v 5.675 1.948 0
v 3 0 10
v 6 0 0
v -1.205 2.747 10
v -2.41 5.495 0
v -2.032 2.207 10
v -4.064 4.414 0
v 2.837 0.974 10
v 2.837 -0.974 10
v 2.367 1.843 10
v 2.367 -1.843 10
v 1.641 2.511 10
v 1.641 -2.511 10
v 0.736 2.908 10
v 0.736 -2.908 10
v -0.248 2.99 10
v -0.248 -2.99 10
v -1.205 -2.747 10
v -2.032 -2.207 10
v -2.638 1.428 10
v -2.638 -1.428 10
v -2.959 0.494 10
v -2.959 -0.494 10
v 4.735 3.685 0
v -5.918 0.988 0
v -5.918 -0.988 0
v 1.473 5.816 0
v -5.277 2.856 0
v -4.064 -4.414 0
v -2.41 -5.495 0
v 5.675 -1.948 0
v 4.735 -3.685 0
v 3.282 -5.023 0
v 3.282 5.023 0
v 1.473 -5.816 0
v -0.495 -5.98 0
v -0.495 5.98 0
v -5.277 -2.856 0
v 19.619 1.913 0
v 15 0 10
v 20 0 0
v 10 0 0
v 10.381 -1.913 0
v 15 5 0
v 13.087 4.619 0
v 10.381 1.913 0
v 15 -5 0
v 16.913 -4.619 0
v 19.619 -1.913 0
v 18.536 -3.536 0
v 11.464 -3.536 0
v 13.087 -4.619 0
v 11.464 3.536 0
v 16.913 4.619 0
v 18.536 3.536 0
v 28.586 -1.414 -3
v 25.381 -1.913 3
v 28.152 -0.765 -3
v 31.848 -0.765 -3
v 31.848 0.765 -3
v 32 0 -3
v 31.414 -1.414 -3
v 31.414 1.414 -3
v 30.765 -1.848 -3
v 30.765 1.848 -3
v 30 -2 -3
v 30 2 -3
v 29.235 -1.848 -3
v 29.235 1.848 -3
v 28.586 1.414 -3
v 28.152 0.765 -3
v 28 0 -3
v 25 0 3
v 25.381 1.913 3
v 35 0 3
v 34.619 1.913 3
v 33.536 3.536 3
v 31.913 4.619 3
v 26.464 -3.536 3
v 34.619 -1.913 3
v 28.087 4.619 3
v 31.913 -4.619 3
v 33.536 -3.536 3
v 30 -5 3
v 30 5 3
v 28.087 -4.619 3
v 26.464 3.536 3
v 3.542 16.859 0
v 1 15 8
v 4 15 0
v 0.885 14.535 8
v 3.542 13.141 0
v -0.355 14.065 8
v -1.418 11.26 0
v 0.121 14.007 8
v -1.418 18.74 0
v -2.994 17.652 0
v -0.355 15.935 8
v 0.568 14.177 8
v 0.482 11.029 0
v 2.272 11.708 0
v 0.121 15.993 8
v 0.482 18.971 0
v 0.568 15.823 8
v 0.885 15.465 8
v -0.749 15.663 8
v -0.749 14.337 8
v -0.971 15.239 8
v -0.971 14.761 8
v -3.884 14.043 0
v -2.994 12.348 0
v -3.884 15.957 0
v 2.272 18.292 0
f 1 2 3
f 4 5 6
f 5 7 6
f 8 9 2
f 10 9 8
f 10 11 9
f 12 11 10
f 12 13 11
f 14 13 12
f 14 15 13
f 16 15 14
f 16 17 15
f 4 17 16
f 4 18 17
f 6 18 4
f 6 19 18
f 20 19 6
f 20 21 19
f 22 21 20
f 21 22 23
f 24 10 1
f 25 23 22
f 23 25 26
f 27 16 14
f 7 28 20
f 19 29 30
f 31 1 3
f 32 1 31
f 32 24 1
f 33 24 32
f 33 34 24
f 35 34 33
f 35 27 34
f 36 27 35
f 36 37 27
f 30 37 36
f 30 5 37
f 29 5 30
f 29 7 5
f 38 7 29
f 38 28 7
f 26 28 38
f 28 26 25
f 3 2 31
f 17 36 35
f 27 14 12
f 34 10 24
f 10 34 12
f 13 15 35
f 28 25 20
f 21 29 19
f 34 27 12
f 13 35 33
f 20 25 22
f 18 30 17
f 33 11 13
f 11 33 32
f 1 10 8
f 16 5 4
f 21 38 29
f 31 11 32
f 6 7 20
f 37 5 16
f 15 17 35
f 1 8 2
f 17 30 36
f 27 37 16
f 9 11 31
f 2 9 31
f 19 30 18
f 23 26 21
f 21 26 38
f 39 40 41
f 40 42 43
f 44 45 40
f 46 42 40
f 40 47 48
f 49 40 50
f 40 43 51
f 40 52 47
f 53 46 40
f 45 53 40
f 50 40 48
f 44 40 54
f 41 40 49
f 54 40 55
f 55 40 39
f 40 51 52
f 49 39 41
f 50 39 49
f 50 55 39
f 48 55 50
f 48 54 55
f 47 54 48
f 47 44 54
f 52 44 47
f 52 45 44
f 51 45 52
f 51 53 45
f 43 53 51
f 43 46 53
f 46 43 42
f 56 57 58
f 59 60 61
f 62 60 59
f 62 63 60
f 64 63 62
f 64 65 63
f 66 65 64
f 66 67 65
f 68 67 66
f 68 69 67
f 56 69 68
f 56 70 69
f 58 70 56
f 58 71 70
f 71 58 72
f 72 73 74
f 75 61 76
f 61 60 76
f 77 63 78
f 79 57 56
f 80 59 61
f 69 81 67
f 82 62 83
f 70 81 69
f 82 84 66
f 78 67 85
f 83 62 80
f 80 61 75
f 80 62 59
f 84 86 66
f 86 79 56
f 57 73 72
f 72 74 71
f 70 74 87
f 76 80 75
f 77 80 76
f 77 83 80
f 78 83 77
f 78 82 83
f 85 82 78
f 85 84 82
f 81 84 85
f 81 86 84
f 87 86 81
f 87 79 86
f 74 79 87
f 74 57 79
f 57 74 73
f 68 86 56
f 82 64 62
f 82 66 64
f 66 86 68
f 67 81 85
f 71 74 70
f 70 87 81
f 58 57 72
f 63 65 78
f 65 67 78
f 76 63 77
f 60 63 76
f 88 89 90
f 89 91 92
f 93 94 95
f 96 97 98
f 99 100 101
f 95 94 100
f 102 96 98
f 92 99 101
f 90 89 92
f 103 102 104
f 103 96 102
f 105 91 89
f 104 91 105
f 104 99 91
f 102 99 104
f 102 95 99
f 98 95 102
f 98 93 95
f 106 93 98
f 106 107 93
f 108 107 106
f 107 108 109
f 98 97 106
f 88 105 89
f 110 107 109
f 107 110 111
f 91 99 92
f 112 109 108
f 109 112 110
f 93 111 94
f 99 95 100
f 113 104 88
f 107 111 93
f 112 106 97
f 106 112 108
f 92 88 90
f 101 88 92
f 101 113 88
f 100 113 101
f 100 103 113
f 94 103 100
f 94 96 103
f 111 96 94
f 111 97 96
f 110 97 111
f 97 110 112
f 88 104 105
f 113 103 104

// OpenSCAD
// Zweck: Kegel und Kegelstümpfe über r1/r2, d1/d2 und Spitze (d2 = 0).
cylinder(h = 10, r1 = 6, r2 = 3);
translate([15, 0, 0]) cylinder(h = 10, d1 = 10, d2 = 0);
translate([30, 0, 0]) cylinder(h = 6, r1 = 2, r2 = 5, center = true);
translate([0, 15, 0]) cylinder(8, 4, 1);
